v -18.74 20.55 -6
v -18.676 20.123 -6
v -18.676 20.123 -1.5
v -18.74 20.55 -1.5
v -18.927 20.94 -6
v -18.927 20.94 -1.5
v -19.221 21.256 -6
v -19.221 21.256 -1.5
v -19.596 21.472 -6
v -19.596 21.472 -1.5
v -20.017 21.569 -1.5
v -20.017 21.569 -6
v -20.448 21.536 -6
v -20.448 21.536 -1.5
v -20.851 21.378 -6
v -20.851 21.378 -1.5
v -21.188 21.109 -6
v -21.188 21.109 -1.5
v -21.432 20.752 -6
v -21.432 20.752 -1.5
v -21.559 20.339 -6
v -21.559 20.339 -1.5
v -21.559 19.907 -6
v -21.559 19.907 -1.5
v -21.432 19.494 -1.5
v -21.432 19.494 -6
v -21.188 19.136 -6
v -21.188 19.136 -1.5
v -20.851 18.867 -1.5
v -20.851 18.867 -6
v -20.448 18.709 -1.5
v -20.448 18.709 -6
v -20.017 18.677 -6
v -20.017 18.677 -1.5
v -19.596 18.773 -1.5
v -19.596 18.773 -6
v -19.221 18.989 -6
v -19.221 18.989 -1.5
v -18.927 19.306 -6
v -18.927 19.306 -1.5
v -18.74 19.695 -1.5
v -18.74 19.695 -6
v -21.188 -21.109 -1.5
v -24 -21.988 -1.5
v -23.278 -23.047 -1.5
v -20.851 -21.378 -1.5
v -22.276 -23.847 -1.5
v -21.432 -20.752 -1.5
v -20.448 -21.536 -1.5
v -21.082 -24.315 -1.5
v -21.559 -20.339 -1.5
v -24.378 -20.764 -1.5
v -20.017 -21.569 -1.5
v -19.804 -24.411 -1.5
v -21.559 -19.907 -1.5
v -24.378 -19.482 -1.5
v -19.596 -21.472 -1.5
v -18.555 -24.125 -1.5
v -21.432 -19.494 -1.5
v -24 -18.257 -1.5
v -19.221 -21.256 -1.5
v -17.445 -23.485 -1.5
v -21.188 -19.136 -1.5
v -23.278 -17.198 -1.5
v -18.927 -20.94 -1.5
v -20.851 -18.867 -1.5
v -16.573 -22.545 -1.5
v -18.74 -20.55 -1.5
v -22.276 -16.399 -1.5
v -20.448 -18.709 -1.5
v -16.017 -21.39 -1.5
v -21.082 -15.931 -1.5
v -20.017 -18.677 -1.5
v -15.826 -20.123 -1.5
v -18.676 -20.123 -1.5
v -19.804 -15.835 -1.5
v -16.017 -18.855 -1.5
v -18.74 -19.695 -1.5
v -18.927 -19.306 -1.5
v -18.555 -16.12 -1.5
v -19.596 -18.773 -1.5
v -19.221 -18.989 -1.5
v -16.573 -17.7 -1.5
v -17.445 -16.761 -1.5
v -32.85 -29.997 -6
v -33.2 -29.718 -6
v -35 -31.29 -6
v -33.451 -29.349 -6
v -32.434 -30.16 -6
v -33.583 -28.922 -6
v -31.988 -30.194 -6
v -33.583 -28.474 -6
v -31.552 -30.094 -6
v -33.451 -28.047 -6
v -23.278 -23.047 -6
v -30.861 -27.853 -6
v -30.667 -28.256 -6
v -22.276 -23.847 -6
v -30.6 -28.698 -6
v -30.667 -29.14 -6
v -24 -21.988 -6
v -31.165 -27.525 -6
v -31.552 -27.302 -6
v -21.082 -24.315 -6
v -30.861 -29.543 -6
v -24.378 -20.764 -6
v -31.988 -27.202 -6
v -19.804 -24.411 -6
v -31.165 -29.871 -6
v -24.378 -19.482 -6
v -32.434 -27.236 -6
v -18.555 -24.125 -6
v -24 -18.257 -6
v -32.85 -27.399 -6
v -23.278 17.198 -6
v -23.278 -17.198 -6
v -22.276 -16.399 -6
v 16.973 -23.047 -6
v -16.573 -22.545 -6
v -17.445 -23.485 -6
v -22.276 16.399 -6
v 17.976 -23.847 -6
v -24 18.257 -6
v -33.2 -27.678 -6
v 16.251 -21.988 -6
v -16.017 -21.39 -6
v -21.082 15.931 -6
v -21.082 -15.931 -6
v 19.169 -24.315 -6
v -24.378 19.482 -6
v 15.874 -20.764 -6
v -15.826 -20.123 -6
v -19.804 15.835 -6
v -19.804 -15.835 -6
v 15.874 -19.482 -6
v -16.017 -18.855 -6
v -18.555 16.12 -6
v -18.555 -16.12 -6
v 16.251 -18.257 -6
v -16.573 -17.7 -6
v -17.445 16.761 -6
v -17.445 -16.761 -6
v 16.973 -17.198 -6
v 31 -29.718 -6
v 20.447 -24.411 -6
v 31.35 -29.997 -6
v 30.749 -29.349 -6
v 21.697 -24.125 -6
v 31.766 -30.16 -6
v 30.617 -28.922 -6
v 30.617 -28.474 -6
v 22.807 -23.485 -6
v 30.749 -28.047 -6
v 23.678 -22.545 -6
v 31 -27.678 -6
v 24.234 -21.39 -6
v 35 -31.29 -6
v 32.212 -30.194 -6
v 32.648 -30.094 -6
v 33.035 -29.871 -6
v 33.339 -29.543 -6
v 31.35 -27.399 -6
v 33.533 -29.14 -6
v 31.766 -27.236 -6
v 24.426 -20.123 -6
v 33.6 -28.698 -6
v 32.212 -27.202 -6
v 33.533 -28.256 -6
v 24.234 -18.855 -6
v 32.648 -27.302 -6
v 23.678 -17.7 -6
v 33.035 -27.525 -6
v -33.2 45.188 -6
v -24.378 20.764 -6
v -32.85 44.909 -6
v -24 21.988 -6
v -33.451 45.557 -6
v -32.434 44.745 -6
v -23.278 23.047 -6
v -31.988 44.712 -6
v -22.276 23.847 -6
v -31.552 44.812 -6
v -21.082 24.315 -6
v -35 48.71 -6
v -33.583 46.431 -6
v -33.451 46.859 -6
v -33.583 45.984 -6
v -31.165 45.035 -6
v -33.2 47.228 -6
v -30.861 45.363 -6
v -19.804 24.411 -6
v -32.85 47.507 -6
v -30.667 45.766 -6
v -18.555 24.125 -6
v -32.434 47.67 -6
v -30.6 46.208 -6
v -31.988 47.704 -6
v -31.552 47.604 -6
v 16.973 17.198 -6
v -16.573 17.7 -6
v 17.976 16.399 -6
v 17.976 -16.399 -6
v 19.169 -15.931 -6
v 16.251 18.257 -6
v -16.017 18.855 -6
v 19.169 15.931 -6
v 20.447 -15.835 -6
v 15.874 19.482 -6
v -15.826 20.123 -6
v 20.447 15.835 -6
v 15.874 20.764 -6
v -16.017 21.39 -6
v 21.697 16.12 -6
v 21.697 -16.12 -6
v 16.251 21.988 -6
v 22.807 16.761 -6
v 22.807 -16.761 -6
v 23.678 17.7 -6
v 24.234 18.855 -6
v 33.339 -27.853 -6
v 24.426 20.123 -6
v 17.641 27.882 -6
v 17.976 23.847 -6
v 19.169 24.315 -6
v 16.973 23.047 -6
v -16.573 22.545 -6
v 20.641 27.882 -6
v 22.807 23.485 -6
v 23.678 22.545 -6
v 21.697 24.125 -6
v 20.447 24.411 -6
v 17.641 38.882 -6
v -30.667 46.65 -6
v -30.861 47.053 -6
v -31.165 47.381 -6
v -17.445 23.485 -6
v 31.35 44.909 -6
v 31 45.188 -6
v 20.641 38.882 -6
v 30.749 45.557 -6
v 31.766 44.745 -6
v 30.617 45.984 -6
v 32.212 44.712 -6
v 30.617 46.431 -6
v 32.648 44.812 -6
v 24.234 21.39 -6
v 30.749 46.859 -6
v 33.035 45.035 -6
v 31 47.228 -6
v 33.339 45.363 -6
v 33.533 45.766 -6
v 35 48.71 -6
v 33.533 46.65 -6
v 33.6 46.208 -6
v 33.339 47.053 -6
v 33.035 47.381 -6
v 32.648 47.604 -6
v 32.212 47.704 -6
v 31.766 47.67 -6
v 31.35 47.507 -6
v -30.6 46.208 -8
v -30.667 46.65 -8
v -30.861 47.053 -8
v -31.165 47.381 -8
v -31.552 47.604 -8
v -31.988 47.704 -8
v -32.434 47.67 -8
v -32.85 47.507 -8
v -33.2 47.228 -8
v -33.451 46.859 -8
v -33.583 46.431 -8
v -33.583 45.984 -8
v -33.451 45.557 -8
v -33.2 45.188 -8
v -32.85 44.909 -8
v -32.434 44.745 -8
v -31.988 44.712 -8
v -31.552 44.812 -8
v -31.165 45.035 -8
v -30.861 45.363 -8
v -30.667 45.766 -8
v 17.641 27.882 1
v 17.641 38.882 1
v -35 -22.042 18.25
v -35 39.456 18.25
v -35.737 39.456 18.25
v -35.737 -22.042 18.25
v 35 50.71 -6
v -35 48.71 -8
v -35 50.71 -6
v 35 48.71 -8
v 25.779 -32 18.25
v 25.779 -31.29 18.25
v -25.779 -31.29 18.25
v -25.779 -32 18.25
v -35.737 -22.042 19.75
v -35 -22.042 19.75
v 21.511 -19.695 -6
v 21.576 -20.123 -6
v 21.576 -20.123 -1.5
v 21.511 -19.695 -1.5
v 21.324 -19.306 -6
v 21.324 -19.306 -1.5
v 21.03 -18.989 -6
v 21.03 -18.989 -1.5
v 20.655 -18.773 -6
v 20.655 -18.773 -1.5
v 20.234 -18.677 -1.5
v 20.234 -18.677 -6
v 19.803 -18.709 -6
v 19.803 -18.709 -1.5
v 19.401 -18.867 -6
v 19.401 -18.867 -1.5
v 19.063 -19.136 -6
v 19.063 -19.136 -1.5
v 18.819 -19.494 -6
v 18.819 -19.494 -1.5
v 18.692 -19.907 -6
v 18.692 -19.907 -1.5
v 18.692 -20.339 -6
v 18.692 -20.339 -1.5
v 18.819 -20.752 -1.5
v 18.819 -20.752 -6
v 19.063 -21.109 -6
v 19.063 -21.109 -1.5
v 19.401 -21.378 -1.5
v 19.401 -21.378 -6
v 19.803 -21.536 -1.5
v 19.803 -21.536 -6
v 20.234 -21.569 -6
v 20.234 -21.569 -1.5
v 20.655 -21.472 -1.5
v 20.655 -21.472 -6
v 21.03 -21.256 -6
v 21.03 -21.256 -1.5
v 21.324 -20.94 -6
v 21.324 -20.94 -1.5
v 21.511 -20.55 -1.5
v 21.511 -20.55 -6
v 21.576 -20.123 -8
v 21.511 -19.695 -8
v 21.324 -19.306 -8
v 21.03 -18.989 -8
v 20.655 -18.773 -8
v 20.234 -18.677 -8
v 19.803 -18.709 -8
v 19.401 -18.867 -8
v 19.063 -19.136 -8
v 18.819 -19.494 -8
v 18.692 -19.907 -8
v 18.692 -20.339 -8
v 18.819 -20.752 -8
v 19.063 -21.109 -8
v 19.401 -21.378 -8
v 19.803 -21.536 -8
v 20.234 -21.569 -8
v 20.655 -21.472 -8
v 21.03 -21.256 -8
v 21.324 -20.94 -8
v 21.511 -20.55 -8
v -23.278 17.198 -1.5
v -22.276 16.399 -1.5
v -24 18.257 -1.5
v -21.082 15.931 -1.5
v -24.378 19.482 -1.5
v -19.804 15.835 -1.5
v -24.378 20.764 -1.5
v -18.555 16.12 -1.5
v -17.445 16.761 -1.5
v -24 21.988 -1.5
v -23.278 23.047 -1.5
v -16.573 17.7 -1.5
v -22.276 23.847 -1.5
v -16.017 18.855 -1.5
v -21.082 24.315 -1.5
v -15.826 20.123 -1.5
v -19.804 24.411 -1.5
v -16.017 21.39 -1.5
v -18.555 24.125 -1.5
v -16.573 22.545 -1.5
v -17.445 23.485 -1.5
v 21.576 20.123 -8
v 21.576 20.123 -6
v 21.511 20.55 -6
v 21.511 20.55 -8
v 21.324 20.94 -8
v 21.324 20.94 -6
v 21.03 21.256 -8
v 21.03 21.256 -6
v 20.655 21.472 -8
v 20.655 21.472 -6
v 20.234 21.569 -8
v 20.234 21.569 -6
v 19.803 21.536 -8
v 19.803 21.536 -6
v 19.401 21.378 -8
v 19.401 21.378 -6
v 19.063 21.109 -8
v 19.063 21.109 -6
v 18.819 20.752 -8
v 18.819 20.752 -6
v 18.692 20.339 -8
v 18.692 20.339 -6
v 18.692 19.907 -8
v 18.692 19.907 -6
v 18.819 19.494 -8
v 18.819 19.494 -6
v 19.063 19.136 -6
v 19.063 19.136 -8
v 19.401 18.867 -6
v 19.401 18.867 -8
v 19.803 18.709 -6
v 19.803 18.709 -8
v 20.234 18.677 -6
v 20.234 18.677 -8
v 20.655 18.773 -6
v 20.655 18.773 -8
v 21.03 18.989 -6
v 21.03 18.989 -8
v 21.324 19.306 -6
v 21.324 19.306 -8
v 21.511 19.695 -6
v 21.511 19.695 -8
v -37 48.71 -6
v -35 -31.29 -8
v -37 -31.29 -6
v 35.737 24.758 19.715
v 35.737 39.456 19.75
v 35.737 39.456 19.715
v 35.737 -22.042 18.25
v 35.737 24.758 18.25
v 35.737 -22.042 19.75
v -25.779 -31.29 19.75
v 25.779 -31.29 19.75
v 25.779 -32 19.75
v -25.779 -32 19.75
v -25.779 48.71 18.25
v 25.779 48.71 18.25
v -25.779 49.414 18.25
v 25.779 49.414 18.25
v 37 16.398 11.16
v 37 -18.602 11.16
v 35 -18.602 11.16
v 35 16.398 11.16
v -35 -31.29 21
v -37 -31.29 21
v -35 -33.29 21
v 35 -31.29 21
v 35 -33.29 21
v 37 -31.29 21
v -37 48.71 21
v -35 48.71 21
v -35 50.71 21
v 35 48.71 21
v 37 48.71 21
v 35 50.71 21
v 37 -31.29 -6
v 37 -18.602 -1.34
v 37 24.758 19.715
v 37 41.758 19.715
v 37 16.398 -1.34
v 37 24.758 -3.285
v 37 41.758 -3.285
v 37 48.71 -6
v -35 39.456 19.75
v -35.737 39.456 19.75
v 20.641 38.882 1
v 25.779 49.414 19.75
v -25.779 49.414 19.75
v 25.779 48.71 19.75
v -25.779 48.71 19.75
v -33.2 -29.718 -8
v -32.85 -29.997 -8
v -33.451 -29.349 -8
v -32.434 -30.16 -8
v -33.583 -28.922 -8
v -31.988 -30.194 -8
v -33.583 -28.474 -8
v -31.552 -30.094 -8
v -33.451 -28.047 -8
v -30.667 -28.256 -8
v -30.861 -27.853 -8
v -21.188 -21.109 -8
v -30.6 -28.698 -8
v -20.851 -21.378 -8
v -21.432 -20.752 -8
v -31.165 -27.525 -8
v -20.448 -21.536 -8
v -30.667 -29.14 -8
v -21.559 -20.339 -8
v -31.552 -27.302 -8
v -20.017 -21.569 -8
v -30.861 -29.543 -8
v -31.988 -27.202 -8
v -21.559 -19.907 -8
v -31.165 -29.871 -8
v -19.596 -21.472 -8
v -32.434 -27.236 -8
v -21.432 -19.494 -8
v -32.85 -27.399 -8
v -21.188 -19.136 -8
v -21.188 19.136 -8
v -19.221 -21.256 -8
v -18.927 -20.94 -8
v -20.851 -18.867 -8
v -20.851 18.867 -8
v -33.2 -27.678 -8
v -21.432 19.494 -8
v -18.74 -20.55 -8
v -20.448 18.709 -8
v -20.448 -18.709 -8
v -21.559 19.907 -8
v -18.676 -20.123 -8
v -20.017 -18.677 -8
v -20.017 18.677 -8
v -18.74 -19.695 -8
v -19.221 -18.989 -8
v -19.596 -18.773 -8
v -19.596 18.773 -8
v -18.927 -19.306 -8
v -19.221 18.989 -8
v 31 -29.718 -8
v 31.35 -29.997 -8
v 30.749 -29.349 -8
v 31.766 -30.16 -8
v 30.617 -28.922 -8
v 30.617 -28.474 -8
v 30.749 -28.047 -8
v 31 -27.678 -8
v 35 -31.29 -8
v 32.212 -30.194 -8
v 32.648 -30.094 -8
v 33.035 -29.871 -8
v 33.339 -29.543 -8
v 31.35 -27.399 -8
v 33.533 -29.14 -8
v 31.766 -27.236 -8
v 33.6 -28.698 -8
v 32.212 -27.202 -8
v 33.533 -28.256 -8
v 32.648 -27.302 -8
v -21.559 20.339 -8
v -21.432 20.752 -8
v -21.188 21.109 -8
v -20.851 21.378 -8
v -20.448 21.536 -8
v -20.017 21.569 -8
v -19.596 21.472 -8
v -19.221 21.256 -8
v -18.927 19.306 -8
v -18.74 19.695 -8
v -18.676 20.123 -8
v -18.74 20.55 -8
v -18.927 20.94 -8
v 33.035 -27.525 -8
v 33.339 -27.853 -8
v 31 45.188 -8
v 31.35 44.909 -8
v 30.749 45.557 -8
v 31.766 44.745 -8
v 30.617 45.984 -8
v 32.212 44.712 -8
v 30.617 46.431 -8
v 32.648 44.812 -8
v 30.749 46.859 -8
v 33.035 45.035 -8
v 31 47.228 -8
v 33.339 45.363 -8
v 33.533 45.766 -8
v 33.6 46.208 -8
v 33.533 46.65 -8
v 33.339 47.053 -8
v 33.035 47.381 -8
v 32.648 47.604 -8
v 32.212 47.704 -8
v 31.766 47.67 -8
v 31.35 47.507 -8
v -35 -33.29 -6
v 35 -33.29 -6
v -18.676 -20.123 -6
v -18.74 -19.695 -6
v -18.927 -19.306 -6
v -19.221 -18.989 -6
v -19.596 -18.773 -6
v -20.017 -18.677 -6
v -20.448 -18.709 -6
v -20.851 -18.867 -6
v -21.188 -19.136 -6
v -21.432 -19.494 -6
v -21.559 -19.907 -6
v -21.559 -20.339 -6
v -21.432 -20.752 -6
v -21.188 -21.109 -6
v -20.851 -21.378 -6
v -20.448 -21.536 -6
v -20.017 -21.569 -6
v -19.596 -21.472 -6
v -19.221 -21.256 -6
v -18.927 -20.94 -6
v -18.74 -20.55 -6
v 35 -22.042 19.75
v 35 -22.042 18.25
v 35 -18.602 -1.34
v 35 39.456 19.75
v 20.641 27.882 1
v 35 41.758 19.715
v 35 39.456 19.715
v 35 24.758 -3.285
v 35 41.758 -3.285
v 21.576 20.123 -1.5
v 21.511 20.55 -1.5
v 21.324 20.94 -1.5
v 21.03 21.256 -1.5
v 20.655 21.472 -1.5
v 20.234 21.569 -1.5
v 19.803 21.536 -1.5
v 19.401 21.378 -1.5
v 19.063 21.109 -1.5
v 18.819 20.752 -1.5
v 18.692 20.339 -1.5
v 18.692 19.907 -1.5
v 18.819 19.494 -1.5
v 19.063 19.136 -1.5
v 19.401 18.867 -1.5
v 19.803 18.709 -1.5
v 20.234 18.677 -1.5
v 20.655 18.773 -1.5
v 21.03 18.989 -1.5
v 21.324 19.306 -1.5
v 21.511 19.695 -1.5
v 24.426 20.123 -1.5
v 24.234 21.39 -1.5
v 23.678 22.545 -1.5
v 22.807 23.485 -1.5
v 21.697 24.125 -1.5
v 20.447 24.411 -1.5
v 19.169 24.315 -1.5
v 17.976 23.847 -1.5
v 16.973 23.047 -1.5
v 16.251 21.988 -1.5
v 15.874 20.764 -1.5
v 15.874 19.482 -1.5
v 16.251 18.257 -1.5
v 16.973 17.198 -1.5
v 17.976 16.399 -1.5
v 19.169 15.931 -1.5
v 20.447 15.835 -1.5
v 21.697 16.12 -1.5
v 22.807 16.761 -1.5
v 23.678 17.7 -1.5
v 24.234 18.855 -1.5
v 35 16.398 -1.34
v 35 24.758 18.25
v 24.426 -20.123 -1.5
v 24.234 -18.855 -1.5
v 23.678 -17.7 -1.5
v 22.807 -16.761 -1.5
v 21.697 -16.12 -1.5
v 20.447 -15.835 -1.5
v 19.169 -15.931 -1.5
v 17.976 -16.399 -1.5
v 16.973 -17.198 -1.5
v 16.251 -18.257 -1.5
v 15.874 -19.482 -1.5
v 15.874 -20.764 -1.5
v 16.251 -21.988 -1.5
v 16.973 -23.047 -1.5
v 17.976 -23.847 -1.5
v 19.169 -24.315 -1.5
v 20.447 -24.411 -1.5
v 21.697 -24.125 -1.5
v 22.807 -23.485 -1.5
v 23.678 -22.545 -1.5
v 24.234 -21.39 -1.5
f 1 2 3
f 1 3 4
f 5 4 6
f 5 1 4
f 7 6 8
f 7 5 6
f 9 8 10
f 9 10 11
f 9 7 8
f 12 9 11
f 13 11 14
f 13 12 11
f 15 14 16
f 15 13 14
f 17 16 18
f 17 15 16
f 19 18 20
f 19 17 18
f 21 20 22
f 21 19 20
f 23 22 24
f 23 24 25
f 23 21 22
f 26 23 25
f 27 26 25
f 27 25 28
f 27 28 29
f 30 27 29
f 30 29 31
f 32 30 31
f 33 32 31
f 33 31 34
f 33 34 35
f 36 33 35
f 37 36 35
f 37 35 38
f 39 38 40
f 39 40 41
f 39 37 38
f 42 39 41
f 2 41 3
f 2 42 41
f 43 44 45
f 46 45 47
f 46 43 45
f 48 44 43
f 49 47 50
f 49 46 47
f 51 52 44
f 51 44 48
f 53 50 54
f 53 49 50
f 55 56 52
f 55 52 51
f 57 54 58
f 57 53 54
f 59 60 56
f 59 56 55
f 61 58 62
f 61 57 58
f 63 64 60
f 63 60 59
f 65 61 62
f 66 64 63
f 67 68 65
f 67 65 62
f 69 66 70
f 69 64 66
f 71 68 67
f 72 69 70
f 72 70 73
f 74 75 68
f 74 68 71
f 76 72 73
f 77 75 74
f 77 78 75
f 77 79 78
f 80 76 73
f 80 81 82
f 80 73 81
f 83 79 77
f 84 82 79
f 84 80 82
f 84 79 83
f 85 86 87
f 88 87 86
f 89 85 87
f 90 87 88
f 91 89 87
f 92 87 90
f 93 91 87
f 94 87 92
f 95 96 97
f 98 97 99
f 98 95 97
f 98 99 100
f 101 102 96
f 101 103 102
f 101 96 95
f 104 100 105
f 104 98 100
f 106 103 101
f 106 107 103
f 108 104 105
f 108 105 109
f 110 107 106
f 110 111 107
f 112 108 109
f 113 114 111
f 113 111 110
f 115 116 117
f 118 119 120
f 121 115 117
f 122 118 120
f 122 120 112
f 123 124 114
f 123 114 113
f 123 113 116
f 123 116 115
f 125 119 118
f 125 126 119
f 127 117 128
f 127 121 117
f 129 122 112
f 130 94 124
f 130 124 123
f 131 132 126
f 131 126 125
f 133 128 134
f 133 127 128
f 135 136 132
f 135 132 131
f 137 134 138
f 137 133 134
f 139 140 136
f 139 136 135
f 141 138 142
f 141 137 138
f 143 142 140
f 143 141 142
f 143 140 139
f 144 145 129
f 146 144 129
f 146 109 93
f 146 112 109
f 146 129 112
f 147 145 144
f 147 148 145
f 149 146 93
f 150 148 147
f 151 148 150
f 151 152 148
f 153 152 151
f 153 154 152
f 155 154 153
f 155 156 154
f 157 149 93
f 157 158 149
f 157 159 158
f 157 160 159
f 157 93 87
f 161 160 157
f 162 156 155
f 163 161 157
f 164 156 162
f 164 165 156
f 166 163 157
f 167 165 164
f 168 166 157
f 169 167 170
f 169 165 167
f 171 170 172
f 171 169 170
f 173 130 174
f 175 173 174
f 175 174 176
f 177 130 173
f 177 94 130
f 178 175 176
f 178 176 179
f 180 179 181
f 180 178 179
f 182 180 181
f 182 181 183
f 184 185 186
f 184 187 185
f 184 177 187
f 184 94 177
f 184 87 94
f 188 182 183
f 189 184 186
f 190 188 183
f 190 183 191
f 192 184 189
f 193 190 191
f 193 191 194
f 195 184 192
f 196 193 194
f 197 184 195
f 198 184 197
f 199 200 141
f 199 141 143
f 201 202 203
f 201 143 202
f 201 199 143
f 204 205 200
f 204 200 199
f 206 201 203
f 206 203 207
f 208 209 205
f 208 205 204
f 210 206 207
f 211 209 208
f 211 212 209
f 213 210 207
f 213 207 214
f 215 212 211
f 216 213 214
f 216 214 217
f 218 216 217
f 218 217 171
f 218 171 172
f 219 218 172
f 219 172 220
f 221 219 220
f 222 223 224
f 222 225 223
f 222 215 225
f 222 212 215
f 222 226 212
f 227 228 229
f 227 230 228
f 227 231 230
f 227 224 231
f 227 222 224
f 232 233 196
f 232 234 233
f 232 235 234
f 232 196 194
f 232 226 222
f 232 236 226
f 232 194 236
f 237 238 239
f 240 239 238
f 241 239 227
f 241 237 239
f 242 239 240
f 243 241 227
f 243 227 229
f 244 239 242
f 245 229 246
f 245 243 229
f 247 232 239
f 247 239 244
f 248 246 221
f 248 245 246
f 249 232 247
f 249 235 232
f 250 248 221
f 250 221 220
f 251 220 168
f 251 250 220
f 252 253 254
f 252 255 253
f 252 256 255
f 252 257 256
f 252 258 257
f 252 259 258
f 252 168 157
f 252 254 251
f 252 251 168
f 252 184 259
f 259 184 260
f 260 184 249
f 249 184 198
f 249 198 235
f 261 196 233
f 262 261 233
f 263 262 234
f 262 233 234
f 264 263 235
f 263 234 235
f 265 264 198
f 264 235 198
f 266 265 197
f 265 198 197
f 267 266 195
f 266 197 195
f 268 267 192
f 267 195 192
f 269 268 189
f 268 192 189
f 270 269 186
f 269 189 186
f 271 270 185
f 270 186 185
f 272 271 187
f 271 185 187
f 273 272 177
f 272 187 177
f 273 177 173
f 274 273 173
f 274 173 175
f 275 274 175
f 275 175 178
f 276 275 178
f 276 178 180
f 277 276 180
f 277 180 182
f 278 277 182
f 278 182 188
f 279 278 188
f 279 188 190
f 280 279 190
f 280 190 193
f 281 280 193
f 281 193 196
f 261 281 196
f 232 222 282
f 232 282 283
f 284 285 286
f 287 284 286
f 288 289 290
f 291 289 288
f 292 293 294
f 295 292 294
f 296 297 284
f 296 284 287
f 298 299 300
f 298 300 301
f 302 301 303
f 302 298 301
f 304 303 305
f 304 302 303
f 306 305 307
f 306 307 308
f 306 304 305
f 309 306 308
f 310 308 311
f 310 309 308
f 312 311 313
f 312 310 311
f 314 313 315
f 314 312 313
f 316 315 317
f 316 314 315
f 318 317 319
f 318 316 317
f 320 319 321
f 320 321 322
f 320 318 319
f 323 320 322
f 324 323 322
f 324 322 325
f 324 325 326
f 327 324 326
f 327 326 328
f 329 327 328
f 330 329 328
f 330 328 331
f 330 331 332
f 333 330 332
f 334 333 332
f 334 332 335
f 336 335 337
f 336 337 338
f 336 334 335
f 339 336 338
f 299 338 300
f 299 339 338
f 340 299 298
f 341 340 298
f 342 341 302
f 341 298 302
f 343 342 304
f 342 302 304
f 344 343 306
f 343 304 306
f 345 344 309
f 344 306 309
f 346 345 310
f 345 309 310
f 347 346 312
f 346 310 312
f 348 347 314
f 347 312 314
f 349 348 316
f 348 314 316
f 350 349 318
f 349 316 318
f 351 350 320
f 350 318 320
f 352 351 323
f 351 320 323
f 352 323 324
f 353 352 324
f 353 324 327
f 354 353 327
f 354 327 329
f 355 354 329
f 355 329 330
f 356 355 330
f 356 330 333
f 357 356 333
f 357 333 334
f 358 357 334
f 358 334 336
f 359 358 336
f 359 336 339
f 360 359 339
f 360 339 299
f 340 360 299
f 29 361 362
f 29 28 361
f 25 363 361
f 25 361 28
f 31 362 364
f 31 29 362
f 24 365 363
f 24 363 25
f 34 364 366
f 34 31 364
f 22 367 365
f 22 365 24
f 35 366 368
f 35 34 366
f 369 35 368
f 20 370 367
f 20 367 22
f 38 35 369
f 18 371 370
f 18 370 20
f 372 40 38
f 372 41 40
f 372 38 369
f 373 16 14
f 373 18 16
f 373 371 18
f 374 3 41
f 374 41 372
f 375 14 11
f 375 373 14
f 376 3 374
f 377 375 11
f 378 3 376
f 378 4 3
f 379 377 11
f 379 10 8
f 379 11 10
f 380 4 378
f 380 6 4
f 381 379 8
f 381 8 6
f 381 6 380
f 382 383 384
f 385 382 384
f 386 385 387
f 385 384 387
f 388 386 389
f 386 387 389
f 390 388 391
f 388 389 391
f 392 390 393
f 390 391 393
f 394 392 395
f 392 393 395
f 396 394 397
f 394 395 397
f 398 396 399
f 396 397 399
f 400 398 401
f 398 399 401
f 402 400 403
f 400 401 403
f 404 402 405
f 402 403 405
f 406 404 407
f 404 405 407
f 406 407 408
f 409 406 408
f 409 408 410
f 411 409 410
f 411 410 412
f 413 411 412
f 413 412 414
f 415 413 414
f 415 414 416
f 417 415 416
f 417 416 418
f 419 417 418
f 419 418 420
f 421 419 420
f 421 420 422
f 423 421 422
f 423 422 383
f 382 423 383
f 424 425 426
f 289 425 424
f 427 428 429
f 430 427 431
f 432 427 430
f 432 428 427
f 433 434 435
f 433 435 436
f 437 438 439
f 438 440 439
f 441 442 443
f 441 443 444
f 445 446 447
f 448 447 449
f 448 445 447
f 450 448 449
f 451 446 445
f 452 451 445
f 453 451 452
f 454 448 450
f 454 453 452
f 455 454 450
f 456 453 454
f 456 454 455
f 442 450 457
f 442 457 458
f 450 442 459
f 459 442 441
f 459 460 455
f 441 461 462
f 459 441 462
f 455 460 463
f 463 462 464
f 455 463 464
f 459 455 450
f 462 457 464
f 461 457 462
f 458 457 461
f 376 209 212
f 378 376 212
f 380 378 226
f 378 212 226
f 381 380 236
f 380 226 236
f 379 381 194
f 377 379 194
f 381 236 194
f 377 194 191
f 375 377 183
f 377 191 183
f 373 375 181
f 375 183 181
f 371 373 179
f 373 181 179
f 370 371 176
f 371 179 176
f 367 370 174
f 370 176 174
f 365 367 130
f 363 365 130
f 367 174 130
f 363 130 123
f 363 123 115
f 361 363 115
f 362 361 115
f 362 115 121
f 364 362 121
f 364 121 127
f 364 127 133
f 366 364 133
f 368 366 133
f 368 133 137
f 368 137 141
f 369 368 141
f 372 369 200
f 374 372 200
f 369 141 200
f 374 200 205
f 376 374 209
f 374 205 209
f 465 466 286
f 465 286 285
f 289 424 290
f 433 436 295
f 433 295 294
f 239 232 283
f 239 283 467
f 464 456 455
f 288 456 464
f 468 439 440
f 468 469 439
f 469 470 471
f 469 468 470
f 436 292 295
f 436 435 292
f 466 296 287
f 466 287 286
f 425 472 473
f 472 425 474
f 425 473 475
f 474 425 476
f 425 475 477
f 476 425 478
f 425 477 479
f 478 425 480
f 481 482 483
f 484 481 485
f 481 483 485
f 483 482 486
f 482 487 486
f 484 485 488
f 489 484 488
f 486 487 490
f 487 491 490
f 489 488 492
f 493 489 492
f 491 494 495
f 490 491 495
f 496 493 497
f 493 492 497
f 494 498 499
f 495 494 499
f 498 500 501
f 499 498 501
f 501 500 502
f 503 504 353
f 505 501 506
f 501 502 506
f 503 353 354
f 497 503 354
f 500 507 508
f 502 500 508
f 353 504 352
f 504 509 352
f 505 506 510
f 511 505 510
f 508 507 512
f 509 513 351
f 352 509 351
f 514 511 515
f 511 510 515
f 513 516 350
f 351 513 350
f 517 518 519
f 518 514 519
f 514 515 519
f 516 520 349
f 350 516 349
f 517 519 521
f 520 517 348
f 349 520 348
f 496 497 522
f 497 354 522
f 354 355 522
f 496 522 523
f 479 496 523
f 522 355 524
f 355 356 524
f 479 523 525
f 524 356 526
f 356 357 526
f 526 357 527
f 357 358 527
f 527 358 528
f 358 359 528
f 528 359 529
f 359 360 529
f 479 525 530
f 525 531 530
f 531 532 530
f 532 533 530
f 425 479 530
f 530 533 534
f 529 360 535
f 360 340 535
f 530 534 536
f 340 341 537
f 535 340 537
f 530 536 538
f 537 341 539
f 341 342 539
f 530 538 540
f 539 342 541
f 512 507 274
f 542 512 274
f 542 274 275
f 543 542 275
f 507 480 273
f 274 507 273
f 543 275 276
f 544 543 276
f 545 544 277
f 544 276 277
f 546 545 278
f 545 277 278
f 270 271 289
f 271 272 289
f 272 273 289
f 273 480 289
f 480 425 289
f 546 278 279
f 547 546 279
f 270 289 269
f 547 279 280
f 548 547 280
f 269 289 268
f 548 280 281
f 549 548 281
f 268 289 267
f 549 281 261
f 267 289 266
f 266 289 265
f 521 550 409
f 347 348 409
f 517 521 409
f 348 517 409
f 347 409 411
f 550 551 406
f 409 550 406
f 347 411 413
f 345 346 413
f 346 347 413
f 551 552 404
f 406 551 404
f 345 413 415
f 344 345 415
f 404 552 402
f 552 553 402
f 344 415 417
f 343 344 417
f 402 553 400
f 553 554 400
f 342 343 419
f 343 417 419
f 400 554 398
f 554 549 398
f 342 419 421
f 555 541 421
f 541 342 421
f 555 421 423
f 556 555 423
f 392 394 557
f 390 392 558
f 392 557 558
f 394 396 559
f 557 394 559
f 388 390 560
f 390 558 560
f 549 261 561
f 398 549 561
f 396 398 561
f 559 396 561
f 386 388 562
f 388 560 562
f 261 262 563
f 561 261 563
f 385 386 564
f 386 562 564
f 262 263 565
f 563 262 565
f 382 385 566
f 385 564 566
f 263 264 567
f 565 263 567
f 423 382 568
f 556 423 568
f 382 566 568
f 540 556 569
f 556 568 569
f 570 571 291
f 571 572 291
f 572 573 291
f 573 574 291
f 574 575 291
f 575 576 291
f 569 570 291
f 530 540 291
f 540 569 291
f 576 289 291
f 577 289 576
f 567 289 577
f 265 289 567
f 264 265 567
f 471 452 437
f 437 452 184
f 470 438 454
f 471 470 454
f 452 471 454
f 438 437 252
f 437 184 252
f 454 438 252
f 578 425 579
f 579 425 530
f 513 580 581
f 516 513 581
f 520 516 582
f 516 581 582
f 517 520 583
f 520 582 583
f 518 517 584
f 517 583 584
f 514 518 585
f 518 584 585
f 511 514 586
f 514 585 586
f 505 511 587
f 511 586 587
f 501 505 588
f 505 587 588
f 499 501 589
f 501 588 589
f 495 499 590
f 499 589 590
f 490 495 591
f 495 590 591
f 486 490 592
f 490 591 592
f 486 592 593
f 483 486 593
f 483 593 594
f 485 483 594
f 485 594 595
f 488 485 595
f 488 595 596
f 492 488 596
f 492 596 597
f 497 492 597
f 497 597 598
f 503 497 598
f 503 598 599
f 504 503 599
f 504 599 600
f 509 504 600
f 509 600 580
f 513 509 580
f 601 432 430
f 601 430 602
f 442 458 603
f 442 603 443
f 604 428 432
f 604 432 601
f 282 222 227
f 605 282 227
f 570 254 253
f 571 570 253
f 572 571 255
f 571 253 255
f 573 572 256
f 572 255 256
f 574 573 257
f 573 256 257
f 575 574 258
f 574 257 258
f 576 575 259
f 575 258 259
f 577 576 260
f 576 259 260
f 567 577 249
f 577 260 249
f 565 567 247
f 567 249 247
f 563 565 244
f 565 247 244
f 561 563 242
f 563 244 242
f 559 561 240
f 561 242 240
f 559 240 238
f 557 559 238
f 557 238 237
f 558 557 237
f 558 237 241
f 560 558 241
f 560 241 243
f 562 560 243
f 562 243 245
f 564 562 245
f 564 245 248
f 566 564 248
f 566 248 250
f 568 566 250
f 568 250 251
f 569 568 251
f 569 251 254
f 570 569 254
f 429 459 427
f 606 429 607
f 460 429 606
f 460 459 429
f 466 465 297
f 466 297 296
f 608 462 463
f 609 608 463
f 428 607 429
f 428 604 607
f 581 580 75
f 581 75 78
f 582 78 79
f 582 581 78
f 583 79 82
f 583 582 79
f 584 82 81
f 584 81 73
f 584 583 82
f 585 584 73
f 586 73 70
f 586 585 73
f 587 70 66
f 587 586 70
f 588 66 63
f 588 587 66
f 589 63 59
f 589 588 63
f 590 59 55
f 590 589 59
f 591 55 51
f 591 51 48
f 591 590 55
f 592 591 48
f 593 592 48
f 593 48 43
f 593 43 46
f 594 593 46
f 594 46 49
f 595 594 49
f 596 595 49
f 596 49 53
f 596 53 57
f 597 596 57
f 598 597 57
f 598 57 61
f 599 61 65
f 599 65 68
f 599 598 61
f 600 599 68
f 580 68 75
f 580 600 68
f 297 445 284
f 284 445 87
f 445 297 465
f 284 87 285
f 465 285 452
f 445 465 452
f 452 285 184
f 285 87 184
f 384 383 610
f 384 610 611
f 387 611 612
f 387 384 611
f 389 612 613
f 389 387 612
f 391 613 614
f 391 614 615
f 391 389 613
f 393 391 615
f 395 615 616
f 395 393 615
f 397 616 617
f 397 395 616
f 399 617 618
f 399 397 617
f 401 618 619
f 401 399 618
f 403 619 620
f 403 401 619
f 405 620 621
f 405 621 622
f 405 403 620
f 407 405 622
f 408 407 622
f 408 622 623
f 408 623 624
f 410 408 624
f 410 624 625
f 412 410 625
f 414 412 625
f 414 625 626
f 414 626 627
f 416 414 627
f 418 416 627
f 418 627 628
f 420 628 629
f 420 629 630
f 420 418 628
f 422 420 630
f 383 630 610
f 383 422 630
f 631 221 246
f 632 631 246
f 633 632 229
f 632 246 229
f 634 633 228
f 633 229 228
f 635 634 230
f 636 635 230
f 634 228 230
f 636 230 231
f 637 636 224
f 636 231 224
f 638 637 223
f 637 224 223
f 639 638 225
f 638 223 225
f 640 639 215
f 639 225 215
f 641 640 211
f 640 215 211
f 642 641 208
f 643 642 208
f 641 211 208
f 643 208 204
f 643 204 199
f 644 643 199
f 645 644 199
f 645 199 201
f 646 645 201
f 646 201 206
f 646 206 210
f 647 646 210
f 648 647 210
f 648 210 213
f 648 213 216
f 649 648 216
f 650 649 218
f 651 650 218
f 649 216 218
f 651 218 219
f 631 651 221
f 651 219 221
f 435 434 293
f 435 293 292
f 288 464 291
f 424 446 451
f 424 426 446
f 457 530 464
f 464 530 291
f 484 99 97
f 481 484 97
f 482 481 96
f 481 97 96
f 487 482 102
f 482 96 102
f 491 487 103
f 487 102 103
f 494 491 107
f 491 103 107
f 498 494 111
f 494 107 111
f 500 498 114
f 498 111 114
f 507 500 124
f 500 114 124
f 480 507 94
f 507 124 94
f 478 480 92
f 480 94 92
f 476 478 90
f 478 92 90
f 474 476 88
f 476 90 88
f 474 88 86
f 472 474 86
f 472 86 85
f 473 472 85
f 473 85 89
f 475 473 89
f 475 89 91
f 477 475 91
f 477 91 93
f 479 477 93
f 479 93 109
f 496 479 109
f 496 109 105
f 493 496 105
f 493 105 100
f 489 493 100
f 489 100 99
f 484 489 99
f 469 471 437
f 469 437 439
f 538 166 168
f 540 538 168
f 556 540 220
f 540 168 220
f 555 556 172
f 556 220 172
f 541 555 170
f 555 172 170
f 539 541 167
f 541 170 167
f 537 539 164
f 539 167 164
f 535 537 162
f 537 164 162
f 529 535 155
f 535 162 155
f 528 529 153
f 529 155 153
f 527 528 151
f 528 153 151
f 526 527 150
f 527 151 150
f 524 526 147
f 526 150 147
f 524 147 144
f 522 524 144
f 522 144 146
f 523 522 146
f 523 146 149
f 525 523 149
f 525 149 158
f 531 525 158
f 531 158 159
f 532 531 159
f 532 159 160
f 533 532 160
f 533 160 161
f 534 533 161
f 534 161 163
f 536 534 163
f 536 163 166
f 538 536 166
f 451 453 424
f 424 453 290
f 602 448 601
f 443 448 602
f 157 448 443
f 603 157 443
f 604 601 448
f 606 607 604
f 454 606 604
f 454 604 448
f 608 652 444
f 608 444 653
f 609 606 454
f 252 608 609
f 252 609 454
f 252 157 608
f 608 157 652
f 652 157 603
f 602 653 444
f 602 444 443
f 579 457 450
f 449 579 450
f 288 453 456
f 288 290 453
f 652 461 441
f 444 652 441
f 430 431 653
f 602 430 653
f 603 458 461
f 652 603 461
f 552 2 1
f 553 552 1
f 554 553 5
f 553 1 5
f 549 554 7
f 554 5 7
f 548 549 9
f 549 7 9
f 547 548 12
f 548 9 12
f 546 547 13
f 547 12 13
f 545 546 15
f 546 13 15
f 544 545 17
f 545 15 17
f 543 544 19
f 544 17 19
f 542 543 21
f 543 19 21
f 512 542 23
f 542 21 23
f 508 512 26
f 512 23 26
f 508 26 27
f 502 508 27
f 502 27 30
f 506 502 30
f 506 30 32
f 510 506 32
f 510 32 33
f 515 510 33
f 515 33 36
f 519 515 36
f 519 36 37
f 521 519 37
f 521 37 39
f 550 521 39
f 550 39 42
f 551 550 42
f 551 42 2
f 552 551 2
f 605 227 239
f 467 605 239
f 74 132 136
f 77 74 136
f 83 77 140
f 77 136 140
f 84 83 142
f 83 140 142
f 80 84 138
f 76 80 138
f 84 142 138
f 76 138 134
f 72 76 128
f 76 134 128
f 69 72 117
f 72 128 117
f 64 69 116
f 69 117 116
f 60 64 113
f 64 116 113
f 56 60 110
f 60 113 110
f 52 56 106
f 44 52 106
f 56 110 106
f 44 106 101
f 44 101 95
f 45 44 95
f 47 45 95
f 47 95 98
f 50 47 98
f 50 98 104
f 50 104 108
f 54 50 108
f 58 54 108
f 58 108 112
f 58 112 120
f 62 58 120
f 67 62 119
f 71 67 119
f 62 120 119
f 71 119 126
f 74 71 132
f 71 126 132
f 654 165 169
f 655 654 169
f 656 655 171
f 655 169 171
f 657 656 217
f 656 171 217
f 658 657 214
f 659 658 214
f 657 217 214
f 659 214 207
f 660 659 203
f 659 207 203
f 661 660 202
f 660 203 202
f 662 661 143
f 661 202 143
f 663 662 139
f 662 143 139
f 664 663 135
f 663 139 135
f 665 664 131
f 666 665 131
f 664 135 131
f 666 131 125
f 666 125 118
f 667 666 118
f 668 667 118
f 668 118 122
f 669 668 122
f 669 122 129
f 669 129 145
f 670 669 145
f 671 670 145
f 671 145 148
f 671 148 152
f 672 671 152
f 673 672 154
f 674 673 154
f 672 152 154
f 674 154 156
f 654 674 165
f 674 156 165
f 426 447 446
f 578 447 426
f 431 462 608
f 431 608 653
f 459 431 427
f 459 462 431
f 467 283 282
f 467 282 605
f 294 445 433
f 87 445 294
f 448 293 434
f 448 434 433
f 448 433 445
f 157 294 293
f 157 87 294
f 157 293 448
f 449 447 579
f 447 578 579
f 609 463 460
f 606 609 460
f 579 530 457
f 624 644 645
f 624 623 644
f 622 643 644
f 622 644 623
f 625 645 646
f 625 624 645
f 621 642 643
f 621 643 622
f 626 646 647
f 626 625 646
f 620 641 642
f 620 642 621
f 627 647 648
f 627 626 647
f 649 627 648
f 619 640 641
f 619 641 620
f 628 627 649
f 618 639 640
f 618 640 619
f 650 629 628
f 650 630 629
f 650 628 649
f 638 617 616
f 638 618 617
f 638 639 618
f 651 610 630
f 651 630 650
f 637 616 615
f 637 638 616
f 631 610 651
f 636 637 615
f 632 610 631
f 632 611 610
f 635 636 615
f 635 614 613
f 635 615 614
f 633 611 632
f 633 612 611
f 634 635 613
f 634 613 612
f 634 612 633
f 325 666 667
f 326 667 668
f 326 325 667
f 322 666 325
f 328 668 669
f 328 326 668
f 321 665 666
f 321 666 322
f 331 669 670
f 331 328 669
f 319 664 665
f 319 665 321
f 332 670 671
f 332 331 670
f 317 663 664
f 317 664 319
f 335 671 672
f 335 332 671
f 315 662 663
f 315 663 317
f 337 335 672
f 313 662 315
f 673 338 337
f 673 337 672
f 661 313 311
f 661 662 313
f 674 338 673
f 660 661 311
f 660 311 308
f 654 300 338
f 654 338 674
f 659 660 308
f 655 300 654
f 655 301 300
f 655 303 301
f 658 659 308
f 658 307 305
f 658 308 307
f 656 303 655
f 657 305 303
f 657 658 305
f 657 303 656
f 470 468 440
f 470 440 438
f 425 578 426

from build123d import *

# Parameters (mm, degrees)
PAD005_DEPTH    = 0.75
SKETCH003_W     = 70
SKETCH003_H     = 80
PAD003_DEPTH    = 27
THICKNESS_T     = 2
SKETCH005_W     = 35
SKETCH005_H     = 12.5
SKETCH005_W_2   = 17
SKETCH005_H_2   = 23
POCKET_DEPTH    = 5
CHAMFER_SIZE    = 2
SKETCH010_R     = 1.5
POCKET002_DEPTH = 5
SKETCH011_R     = 4.3
SKETCH011_R_2   = 1.45
PAD009_DEPTH    = 4.5
SKETCH012_W     = 3
SKETCH012_H     = 11
PAD010_DEPTH    = 7
SKETCH013_R     = 1.45
POCKET003_DEPTH = 5


with BuildPart() as pad005:
    # Sketch007 → Pad005 (new body, symmetric)
    with BuildSketch(Plane.XY.offset(19)):
        Polygon((-35.737, 39.45567), (-25.77877, 39.45567), (-25.77877, 49.4139), (25.77877, 49.4139), (25.77877, 39.45567), (35.737, 39.45567), (35.737, -22.04177), (25.77877, -22.04177), (25.77877, -32), (-25.77877, -32), (-25.77877, -22.04177), (-35.737, -22.04177), align=None)
    extrude(amount=PAD005_DEPTH, both=True)


with BuildPart() as chillermodule_case:
    # Sketch003 → Pad003 (new body)
    with BuildSketch(Plane.XY.offset(-6)):
        with Locations((0, 8.709674)):
            Rectangle(SKETCH003_W, SKETCH003_H)
    extrude(amount=PAD003_DEPTH)

    # Thickness
    thickness_openings = [chillermodule_case.faces().sort_by_distance(p)[0] for p in [
        (0, 8.709674, 21),
    ]]
    offset(amount=THICKNESS_T, openings=thickness_openings, kind=Kind.INTERSECTION)

    # Sketch005 → Pocket (cut)
    with BuildSketch(Plane.YZ.offset(37)):
        with Locations((-1.101604, 4.909958)):
            Rectangle(SKETCH005_W, SKETCH005_H)
        with Locations((33.258465, 8.215456)):
            Rectangle(SKETCH005_W_2, SKETCH005_H_2)
    extrude(amount=-POCKET_DEPTH, mode=Mode.SUBTRACT)

    # Chamfer
    chamfer_edges = [chillermodule_case.edges().sort_by_distance(p)[0] for p in [
        (0, -33.290326, -8),
        (37, 8.709674, -8),
        (37, -33.290326, 6.5),
        (-37, -33.290326, 6.5),
        (37, 50.709674, 6.5),
        (-37, 8.709674, -8),
        (-37, 50.709674, 6.5),
        (0, 50.709674, -8),
    ]]
    chamfer(chamfer_edges, length=CHAMFER_SIZE)

    # Cut: cut Pad005
    add(pad005.part, mode=Mode.SUBTRACT)

    # Sketch010 → Pocket002 (cut)
    with BuildSketch(Plane.XY.offset(-6)):
        with Locations((-32.1, 46.207886)):
            Circle(SKETCH010_R)
        with Locations((32.1, 46.207886)):
            Circle(SKETCH010_R)
        with Locations((32.1, -28.698038)):
            Circle(SKETCH010_R)
        with Locations((-32.1, -28.698038)):
            Circle(SKETCH010_R)
    extrude(amount=-POCKET002_DEPTH, mode=Mode.SUBTRACT)

    # Sketch011 → Pad009 (new body)
    with BuildSketch(Plane.XY.offset(-6)):
        with Locations((20.125536, -20.122694)):
            Circle(SKETCH011_R)
        with Locations((20.125536, -20.122694)):
            Circle(SKETCH011_R_2, mode=Mode.SUBTRACT)
        with Locations((-20.125536, -20.122694)):
            Circle(SKETCH011_R)
        with Locations((-20.125536, -20.122694)):
            Circle(SKETCH011_R_2, mode=Mode.SUBTRACT)
        with Locations((-20.125536, 20.122694)):
            Circle(SKETCH011_R)
        with Locations((-20.125536, 20.122694)):
            Circle(SKETCH011_R_2, mode=Mode.SUBTRACT)
        with Locations((20.125536, 20.122694)):
            Circle(SKETCH011_R)
        with Locations((20.125536, 20.122694)):
            Circle(SKETCH011_R_2, mode=Mode.SUBTRACT)
    extrude(amount=PAD009_DEPTH)

    # Sketch012 → Pad010 (new body)
    with BuildSketch(Plane.XY.offset(-6)):
        with Locations((19.14116, 33.381699)):
            Rectangle(SKETCH012_W, SKETCH012_H)
    extrude(amount=PAD010_DEPTH)

    # Sketch013 → Pocket003 (cut)
    with BuildSketch(Plane.XY.offset(-6)):
        with Locations((20.125536, 20.122694)):
            Circle(SKETCH013_R)
        with Locations((-20.125536, 20.122694)):
            Circle(SKETCH013_R)
        with Locations((-20.125536, -20.122694)):
            Circle(SKETCH013_R)
        with Locations((20.125536, -20.122694)):
            Circle(SKETCH013_R)
    extrude(amount=-POCKET003_DEPTH, mode=Mode.SUBTRACT)


solid = chillermodule_case.part
